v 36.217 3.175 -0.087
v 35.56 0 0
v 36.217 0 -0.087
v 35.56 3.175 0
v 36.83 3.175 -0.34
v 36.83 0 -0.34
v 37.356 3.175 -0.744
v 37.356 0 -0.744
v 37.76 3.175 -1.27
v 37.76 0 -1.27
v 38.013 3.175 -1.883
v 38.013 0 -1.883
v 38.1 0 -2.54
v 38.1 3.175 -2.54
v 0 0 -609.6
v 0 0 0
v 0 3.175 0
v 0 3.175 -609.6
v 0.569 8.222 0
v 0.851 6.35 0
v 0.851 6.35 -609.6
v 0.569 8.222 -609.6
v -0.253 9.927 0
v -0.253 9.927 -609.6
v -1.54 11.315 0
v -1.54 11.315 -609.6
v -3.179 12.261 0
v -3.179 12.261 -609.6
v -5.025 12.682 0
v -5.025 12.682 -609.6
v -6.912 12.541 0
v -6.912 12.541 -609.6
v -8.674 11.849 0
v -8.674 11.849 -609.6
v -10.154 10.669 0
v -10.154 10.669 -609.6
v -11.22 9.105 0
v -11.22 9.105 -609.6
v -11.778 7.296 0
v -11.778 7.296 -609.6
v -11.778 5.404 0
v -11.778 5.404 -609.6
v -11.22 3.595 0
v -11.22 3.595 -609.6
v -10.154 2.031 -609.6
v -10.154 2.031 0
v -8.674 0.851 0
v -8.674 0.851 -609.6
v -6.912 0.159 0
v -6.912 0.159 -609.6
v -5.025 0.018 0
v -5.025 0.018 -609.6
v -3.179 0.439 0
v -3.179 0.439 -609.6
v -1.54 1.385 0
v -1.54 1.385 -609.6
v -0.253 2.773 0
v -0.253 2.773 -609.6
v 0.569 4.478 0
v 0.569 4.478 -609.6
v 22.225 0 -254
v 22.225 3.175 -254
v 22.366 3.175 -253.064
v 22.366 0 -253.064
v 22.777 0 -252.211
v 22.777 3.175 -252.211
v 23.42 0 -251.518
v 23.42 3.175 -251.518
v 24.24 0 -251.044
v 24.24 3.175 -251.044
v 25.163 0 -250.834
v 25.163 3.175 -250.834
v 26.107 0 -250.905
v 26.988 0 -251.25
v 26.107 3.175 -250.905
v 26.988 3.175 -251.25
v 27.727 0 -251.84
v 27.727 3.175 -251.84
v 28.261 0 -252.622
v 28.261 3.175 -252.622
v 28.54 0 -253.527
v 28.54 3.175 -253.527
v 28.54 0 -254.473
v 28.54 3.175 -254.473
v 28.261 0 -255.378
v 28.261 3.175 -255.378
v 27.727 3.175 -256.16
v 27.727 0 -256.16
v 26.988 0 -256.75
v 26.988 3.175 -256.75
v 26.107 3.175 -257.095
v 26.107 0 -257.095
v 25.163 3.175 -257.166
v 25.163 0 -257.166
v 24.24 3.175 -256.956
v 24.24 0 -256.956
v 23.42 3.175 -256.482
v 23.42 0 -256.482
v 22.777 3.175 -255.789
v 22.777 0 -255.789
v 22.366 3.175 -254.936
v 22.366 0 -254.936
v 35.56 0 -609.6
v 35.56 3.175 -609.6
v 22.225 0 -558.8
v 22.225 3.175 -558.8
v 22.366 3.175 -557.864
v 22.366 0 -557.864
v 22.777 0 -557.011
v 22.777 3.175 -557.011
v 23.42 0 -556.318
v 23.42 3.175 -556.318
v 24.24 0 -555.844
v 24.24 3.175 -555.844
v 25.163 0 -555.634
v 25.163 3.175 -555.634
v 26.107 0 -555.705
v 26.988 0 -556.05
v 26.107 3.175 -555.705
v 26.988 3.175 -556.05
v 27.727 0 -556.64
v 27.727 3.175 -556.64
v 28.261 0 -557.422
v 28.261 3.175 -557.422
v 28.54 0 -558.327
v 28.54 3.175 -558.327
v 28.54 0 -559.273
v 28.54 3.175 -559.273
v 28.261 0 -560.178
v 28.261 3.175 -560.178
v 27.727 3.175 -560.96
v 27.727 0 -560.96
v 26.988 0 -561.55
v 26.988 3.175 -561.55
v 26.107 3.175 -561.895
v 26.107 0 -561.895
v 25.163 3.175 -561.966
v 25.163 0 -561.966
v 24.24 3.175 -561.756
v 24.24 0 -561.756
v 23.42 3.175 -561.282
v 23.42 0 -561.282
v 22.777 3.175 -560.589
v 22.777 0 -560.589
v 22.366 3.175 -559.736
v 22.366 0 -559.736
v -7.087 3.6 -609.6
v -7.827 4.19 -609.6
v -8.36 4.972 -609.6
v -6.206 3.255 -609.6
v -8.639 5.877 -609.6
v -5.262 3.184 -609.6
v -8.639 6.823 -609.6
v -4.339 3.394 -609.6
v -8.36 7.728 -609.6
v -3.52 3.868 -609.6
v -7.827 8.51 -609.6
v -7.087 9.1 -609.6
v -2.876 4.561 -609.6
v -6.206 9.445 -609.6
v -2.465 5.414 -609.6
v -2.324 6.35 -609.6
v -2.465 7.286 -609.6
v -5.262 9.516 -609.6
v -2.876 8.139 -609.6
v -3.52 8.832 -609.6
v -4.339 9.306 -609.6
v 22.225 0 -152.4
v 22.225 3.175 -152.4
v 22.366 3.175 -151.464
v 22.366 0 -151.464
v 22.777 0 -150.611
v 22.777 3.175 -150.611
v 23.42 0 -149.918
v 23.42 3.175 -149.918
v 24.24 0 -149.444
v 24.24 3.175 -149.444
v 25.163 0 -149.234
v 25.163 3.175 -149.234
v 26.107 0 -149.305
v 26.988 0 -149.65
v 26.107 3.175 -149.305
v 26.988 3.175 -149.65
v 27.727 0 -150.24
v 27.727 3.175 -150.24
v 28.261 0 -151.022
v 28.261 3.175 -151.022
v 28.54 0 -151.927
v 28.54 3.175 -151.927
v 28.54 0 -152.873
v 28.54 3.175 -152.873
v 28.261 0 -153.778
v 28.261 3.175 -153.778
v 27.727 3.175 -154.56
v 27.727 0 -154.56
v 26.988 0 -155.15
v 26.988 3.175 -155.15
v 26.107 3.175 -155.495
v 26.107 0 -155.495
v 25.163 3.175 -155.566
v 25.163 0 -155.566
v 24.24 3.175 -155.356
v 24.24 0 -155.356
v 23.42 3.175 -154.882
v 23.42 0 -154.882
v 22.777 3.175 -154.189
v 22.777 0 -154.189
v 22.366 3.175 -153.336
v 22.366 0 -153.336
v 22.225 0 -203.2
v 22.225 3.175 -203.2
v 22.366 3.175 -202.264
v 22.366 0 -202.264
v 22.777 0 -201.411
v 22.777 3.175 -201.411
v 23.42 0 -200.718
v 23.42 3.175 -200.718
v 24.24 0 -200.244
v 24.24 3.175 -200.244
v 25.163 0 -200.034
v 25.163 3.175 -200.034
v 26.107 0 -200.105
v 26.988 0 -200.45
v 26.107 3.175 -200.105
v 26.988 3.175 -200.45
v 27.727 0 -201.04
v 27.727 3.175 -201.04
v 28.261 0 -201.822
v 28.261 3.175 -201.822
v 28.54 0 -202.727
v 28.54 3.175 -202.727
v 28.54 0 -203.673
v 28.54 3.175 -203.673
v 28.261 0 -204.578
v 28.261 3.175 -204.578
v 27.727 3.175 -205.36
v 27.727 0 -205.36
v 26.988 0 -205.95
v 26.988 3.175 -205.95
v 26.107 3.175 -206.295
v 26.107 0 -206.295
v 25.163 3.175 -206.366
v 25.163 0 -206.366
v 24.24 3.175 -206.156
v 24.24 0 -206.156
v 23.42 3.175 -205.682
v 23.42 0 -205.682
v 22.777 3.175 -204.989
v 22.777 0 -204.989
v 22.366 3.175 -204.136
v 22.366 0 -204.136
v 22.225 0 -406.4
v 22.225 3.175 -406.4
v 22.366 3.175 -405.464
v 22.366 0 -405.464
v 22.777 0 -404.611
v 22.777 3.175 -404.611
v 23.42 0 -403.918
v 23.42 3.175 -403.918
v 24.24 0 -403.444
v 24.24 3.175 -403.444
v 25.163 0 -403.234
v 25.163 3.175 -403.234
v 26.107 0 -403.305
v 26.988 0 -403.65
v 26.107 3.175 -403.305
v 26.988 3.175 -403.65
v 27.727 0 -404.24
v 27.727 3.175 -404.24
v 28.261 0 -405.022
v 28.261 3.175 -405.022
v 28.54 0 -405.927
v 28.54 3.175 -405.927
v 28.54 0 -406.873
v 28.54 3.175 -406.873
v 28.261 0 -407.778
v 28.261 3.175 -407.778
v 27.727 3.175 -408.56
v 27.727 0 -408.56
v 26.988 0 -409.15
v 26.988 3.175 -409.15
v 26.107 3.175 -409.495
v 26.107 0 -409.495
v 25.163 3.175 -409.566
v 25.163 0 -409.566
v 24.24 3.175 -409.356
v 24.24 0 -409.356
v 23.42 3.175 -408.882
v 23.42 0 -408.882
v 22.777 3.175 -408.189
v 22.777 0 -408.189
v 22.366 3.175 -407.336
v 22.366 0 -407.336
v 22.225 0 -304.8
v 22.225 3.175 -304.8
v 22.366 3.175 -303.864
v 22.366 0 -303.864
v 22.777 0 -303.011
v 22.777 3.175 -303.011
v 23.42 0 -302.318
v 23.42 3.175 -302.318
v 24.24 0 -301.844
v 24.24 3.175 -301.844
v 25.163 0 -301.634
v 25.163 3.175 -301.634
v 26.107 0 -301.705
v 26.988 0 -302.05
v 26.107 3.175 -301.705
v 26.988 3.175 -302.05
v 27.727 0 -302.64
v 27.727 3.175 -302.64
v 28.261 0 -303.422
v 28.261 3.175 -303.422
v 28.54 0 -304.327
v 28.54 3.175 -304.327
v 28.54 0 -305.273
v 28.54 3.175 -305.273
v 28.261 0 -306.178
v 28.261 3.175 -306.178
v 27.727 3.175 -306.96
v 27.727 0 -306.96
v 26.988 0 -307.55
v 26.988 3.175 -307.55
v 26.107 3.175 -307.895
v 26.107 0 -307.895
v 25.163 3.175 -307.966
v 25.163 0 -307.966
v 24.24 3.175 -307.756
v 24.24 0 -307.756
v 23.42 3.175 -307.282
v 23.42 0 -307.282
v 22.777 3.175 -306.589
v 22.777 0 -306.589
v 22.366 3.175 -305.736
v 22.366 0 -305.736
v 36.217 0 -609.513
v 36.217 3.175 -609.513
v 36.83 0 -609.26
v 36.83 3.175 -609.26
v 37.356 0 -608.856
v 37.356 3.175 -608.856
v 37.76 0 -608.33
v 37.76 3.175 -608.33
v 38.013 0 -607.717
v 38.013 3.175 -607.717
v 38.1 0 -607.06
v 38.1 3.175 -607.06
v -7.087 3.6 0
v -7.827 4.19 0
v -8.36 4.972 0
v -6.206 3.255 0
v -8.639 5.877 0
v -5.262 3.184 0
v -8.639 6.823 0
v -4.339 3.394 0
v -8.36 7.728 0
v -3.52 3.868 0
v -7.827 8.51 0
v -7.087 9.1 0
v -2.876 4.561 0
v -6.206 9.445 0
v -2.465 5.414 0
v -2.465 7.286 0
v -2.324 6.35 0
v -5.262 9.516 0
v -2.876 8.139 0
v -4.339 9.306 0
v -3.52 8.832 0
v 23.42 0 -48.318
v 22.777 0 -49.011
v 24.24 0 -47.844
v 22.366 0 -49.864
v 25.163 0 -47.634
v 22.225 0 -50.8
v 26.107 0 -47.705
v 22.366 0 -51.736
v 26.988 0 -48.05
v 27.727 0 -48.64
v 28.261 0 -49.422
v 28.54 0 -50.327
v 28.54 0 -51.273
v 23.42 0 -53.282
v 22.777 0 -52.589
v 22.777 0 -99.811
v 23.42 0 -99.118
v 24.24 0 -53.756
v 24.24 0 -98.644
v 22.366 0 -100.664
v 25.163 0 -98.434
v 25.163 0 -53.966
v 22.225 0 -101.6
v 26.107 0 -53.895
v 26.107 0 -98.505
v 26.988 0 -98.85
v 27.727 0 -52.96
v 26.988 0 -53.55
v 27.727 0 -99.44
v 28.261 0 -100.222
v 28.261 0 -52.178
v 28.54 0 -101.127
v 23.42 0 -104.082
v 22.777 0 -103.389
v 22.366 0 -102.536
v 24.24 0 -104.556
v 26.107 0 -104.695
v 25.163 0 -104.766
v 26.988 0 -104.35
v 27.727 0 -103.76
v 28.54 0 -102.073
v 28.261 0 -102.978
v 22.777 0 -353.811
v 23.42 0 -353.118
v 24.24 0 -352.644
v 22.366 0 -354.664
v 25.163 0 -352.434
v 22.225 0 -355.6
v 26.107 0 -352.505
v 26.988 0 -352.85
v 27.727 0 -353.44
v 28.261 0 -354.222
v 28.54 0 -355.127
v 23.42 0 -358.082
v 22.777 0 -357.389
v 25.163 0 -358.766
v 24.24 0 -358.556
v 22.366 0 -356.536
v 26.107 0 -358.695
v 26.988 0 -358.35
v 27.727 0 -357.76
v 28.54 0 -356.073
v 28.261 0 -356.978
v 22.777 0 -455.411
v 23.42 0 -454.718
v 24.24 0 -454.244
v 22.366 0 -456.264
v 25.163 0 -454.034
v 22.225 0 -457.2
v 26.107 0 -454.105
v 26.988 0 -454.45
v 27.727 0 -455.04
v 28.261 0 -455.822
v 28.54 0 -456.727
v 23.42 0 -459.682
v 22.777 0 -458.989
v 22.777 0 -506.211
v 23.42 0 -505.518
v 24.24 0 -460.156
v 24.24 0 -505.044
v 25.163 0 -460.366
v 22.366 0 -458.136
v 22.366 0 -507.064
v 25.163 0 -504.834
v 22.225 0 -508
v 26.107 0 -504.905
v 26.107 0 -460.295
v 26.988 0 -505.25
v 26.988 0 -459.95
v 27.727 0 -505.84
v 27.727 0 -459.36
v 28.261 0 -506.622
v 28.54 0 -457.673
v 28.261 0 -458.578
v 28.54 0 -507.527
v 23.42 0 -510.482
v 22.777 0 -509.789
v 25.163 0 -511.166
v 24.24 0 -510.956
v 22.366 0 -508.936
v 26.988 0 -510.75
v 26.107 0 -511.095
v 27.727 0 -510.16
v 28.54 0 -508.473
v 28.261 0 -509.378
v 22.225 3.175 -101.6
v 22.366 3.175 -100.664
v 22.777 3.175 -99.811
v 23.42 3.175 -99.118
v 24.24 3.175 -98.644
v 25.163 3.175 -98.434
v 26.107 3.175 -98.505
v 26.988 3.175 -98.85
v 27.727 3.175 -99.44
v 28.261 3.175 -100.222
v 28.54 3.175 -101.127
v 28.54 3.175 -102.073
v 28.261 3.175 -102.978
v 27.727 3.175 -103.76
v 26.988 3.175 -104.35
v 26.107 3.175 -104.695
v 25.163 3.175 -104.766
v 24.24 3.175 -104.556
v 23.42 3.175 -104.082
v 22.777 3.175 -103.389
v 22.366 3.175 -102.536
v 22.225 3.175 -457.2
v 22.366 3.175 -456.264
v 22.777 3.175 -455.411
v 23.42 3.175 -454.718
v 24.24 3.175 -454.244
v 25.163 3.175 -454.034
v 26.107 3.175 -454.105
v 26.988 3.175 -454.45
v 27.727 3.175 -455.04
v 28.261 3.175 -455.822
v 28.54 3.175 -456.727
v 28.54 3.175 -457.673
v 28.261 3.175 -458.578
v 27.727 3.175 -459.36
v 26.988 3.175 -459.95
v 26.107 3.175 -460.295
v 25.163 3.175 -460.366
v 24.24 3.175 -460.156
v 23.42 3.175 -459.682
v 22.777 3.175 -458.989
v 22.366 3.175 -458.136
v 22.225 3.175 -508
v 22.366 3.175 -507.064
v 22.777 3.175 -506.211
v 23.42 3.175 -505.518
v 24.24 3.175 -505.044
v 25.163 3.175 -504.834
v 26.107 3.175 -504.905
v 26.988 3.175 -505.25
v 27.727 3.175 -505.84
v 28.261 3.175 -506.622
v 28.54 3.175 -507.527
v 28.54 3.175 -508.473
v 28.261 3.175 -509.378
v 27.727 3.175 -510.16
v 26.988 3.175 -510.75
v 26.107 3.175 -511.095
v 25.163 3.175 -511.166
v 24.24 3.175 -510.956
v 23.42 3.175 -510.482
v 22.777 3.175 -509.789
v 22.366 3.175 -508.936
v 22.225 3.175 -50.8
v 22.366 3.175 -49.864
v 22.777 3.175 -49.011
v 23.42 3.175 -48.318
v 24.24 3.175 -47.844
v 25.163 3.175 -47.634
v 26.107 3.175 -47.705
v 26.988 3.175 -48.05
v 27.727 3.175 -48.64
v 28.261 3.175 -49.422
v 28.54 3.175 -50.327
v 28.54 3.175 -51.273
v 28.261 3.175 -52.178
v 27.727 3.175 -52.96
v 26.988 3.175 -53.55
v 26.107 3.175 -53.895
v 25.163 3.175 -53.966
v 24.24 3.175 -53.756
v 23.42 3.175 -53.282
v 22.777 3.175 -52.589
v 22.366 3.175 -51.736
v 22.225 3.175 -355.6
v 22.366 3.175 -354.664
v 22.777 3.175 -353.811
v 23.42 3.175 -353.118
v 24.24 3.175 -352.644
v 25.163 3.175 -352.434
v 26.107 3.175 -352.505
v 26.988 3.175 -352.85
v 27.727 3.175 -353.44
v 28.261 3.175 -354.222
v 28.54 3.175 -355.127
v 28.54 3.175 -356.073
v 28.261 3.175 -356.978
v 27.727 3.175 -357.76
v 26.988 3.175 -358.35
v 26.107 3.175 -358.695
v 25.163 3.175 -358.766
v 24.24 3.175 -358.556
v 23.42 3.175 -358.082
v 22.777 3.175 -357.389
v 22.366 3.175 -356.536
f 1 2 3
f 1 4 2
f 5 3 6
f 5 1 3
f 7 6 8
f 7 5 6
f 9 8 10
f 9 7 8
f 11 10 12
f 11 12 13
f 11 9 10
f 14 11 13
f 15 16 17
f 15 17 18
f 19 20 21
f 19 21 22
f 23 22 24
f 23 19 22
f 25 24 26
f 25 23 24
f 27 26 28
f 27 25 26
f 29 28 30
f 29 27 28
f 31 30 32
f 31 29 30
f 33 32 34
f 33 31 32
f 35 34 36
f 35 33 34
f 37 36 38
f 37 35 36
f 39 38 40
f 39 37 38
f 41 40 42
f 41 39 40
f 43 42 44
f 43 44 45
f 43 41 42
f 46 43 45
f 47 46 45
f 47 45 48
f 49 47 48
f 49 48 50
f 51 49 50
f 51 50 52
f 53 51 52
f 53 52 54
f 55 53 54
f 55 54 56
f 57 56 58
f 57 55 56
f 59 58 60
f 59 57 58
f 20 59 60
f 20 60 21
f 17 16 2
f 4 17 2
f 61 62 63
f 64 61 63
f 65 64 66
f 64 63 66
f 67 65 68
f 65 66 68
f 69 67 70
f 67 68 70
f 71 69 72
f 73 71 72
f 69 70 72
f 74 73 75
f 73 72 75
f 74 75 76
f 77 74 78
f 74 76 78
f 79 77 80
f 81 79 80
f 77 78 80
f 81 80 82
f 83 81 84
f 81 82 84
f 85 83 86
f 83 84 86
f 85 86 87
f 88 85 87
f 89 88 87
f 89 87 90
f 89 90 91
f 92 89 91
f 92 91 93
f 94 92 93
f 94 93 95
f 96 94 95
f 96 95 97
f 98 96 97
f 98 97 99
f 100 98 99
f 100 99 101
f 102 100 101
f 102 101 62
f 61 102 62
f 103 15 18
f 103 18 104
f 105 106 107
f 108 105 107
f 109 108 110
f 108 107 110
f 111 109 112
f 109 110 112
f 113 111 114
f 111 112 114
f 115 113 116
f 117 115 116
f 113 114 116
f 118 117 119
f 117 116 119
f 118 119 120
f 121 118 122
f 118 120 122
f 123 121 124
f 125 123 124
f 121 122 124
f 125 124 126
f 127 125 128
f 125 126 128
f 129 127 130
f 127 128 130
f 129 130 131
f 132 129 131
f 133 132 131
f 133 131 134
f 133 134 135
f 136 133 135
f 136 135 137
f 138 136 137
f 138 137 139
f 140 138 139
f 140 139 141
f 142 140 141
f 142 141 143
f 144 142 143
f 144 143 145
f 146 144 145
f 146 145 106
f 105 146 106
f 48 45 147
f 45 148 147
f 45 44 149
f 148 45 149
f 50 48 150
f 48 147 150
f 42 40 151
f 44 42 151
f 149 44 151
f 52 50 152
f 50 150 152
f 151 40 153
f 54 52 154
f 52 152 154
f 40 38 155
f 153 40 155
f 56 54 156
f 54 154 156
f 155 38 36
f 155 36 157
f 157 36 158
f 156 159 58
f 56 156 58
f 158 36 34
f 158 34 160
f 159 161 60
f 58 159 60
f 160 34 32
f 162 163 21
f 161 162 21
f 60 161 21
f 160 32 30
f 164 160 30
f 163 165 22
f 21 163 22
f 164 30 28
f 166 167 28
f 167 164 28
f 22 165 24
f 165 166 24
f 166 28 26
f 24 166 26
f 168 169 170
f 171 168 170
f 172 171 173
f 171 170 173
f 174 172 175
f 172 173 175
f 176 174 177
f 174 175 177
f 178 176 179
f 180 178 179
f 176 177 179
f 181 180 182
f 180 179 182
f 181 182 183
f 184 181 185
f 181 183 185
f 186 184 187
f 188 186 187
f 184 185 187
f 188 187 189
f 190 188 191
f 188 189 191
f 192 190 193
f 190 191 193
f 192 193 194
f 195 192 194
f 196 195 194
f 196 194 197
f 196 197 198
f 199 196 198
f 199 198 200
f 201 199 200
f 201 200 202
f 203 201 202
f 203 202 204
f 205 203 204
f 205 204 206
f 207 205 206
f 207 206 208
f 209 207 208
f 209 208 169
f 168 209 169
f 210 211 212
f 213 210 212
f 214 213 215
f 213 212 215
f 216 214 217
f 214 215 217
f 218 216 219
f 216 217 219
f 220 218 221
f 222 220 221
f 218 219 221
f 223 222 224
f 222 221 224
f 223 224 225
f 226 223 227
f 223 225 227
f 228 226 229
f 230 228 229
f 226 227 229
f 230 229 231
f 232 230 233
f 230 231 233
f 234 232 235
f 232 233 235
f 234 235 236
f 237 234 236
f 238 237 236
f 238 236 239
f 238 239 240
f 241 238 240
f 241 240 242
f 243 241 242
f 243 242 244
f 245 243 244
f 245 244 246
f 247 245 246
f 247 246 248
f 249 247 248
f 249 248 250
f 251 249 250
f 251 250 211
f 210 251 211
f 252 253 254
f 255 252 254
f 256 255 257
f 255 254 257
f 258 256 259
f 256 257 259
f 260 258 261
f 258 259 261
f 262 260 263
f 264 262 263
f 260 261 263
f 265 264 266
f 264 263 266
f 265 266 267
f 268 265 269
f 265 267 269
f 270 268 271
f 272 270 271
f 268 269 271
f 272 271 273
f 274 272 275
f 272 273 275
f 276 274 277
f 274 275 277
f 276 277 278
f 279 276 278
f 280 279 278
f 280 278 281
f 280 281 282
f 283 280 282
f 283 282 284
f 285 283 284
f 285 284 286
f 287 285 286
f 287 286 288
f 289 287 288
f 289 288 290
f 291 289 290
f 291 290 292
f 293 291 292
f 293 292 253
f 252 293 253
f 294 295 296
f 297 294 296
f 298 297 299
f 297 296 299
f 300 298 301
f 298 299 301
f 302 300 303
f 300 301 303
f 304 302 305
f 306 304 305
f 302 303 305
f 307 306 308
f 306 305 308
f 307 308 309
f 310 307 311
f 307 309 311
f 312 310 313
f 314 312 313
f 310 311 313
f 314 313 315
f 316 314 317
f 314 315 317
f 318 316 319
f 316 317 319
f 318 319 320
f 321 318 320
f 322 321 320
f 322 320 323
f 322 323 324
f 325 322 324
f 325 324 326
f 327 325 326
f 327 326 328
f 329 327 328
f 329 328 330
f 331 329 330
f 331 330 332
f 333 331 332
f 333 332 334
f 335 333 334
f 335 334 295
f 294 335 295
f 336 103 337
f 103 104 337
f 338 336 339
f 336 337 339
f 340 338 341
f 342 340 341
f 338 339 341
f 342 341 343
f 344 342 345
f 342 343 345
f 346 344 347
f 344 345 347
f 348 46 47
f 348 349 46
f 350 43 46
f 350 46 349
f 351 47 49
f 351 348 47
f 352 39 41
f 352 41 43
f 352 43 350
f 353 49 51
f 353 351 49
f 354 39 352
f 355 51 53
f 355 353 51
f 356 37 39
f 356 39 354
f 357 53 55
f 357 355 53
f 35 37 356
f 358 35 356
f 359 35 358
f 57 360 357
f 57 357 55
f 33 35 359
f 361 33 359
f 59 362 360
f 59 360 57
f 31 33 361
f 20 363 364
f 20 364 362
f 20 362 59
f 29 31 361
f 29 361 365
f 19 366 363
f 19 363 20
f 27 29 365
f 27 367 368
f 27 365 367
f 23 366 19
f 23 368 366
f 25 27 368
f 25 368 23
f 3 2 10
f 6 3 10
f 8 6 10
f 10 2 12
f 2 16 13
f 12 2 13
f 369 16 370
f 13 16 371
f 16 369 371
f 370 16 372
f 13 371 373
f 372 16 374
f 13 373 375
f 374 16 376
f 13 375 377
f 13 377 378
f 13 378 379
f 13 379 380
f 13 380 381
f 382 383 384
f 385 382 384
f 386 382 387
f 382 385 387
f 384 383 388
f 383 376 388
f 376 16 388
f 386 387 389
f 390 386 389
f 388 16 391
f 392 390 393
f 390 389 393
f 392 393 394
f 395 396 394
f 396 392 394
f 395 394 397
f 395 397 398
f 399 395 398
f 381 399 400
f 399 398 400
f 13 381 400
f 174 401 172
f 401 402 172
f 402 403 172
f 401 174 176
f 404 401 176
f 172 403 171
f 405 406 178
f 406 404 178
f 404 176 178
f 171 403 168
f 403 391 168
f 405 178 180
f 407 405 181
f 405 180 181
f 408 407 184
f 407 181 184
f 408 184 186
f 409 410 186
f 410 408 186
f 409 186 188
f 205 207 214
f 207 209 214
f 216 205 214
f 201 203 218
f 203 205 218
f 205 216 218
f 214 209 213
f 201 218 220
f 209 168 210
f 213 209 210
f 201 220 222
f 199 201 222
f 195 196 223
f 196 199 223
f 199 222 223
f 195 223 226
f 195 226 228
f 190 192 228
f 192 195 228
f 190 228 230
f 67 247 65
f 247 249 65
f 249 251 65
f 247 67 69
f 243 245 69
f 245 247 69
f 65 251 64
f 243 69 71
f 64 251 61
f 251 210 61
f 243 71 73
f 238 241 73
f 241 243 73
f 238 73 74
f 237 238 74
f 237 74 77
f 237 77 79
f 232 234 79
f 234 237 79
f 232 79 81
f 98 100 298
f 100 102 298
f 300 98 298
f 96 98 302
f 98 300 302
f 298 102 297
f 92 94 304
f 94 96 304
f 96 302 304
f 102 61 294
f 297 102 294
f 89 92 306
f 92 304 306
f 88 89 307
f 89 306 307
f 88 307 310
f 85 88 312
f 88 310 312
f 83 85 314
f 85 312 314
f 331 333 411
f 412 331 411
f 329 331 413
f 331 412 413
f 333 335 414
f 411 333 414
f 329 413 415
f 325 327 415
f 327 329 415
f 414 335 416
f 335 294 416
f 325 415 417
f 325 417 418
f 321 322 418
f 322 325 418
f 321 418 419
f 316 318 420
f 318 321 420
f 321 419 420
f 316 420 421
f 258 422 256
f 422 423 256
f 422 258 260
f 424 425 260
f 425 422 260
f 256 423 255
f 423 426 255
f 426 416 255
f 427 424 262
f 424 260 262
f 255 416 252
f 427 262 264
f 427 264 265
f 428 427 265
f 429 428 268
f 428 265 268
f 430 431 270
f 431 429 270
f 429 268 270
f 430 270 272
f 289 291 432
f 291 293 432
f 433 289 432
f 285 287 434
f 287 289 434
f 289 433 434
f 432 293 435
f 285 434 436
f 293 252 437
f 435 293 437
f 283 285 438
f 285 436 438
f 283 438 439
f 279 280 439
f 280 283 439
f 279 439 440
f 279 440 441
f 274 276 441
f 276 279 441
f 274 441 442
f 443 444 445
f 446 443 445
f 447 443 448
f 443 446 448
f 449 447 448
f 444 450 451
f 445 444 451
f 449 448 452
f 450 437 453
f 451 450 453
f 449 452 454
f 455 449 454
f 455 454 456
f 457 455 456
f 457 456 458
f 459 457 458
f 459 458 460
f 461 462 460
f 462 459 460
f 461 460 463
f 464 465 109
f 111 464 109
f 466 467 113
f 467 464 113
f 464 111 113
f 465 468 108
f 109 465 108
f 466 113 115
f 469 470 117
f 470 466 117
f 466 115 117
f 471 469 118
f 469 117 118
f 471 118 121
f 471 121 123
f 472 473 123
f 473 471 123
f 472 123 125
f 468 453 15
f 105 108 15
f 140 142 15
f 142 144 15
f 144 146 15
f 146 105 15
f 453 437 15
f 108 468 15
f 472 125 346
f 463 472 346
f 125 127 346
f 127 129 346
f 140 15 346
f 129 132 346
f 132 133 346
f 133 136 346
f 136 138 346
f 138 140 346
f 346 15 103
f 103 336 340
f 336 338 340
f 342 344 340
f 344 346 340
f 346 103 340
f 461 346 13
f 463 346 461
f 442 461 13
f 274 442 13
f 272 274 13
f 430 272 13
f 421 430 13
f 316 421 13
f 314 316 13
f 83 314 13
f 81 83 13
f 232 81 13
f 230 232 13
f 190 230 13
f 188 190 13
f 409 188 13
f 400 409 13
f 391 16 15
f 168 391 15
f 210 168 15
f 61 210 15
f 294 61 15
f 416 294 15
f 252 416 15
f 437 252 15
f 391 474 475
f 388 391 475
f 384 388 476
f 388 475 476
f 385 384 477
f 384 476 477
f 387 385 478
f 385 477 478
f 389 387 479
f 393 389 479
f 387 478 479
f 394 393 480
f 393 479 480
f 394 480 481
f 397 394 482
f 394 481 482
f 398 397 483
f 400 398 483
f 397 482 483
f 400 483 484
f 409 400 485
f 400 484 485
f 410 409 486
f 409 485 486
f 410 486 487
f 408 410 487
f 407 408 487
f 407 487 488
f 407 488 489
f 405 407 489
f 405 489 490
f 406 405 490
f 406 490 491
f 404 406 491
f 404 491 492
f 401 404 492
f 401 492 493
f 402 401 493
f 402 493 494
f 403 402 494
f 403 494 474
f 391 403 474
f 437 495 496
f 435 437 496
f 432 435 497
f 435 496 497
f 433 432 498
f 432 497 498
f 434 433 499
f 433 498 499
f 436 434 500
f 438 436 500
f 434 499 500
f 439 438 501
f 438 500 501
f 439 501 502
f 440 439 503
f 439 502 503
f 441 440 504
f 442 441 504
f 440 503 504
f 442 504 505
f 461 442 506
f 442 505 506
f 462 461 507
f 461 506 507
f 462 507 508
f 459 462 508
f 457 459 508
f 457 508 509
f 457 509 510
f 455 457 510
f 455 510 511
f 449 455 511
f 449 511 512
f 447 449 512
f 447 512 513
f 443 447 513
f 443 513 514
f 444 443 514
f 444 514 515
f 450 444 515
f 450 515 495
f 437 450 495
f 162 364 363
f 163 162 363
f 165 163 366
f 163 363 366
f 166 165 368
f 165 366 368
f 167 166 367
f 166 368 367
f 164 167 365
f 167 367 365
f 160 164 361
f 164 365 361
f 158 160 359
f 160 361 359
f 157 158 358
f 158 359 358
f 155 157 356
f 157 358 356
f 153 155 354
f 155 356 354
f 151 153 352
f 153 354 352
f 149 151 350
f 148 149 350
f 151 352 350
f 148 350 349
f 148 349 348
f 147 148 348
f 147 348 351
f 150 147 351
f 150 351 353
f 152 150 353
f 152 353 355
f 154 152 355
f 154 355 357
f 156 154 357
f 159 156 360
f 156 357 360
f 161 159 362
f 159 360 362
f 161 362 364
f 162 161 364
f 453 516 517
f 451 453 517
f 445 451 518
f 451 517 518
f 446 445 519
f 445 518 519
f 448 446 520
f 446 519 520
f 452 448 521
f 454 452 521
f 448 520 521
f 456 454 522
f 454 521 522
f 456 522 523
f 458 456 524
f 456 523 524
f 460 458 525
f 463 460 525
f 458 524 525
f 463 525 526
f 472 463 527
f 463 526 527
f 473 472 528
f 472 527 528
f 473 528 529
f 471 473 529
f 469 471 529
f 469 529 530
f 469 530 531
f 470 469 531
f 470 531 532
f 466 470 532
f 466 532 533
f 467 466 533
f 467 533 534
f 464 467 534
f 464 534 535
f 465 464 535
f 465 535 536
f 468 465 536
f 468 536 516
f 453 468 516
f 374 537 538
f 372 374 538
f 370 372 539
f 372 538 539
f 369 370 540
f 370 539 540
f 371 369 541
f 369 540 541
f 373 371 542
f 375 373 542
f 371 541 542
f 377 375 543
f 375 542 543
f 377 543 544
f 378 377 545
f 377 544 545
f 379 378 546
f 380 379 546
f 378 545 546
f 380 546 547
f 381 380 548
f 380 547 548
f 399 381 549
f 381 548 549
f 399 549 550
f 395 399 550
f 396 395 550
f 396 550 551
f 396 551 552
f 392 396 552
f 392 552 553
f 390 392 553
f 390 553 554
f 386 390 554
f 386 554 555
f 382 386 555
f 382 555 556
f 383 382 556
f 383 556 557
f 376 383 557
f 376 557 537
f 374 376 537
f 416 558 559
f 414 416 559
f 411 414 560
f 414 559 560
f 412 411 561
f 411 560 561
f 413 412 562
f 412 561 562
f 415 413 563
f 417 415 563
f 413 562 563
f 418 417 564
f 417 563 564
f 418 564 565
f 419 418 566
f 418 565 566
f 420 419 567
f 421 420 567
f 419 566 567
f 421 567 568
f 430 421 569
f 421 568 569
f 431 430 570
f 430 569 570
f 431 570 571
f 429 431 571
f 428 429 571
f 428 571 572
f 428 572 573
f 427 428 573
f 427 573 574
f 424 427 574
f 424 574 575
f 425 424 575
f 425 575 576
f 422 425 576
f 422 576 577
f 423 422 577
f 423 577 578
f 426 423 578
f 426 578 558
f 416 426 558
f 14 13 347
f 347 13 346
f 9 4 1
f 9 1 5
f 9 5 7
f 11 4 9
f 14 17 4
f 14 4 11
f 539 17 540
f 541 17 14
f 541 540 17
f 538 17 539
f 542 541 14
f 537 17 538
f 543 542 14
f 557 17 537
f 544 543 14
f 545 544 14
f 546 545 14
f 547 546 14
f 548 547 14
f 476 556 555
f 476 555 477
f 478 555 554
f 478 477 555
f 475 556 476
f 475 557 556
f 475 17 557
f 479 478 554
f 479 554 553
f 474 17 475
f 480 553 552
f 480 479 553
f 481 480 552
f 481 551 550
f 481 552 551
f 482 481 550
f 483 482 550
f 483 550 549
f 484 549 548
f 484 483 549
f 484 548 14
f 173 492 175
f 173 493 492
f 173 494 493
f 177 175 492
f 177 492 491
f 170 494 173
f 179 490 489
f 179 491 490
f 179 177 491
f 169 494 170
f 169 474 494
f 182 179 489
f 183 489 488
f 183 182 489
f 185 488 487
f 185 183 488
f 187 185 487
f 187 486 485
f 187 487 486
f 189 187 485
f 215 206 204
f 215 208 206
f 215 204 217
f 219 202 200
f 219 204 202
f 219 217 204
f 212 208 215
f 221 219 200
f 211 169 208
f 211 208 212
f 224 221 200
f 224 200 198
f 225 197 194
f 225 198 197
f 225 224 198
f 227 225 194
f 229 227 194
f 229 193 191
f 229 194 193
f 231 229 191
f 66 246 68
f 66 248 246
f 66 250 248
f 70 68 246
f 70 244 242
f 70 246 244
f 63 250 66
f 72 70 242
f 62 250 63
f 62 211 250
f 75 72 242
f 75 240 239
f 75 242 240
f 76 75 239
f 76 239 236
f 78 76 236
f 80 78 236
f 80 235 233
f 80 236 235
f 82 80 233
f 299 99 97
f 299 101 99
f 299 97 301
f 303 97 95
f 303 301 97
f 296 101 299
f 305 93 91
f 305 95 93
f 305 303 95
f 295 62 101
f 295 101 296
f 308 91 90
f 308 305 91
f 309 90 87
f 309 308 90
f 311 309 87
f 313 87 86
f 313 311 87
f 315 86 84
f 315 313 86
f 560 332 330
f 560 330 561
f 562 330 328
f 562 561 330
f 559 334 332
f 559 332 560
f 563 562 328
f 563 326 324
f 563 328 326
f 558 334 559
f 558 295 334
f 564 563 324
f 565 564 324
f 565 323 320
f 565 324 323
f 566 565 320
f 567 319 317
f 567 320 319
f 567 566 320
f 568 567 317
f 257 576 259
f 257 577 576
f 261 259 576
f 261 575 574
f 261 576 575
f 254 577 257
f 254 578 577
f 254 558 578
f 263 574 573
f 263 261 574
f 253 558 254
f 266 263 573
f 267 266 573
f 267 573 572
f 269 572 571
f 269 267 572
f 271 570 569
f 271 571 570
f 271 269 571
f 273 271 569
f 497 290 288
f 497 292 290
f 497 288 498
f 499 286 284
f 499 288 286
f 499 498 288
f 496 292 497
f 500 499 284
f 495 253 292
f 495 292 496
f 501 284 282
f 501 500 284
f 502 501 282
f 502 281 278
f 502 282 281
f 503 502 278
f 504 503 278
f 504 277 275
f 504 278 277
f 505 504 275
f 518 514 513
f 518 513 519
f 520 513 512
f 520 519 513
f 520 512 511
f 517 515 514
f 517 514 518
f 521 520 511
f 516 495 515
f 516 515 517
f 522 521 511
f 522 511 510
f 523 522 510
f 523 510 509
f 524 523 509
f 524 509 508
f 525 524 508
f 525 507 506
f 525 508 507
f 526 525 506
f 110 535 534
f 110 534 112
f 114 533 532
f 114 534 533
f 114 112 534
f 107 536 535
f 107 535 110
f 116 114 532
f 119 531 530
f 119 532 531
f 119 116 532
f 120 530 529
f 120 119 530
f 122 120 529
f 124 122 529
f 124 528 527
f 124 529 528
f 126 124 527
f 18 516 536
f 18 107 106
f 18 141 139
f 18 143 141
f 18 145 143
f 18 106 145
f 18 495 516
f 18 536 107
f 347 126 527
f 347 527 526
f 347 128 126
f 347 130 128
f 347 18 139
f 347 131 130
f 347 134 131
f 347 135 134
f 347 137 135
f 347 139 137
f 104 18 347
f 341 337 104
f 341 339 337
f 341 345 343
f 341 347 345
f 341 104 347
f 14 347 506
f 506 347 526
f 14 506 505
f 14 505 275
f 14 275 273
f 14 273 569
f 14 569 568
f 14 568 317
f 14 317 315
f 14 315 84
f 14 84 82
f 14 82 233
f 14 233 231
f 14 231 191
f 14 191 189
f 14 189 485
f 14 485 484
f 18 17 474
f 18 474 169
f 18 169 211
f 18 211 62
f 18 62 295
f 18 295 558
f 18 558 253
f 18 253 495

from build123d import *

# Parameters (mm, degrees)
SKETCH1_W           = 38.1
SKETCH1_H           = 609.6
BOSS_EXTRUDE1_DEPTH = 3.175
CUT_EXTRUDE1_REACH  = 5.175
SKETCH2_R           = 3.175
FILLET1_R           = 2.54
SKETCH3_R           = 6.35
SKETCH3_R_2         = 3.175
BOSS_EXTRUDE2_DEPTH = 609.6


with BuildPart() as part:
    # Sketch1 → Boss-Extrude1 (new body)
    with BuildSketch(Plane(origin=(0, 0, 0), x_dir=(1, 0, 0), z_dir=(0, 1, 0))):
        with Locations((19.05, 304.8)):
            Rectangle(SKETCH1_W, SKETCH1_H)
    extrude(amount=BOSS_EXTRUDE1_DEPTH)

    # Sketch2 → Cut-Extrude1 (cut, up to next)
    with BuildSketch(Plane(origin=(0, 3.175, 0), x_dir=(-1, 0, 0), z_dir=(0, 1, 0)), mode=Mode.PRIVATE) as cut_extrude1_sk1:
        with Locations((-25.4, -355.6)):
            Circle(SKETCH2_R)
    cut_extrude1_tool1 = extrude(cut_extrude1_sk1.sketch, amount=-CUT_EXTRUDE1_REACH, mode=Mode.PRIVATE) & part.part
    add(cut_extrude1_tool1.solids().sort_by_distance((25.4, 3.175, -355.6))[0], mode=Mode.SUBTRACT)
    # Sketch2 → Cut-Extrude1 (cut, up to next)
    with BuildSketch(Plane(origin=(0, 3.175, 0), x_dir=(-1, 0, 0), z_dir=(0, 1, 0)), mode=Mode.PRIVATE) as cut_extrude1_sk2:
        with Locations((-25.4, -304.8)):
            Circle(SKETCH2_R)
    cut_extrude1_tool2 = extrude(cut_extrude1_sk2.sketch, amount=-CUT_EXTRUDE1_REACH, mode=Mode.PRIVATE) & part.part
    add(cut_extrude1_tool2.solids().sort_by_distance((25.4, 3.175, -304.8))[0], mode=Mode.SUBTRACT)
    # Sketch2 → Cut-Extrude1 (cut, up to next)
    with BuildSketch(Plane(origin=(0, 3.175, 0), x_dir=(-1, 0, 0), z_dir=(0, 1, 0)), mode=Mode.PRIVATE) as cut_extrude1_sk3:
        with Locations((-25.4, -254)):
            Circle(SKETCH2_R)
    cut_extrude1_tool3 = extrude(cut_extrude1_sk3.sketch, amount=-CUT_EXTRUDE1_REACH, mode=Mode.PRIVATE) & part.part
    add(cut_extrude1_tool3.solids().sort_by_distance((25.4, 3.175, -254))[0], mode=Mode.SUBTRACT)
    # Sketch2 → Cut-Extrude1 (cut, up to next)
    with BuildSketch(Plane(origin=(0, 3.175, 0), x_dir=(-1, 0, 0), z_dir=(0, 1, 0)), mode=Mode.PRIVATE) as cut_extrude1_sk4:
        with Locations((-25.4, -406.4)):
            Circle(SKETCH2_R)
    cut_extrude1_tool4 = extrude(cut_extrude1_sk4.sketch, amount=-CUT_EXTRUDE1_REACH, mode=Mode.PRIVATE) & part.part
    add(cut_extrude1_tool4.solids().sort_by_distance((25.4, 3.175, -406.4))[0], mode=Mode.SUBTRACT)
    # Sketch2 → Cut-Extrude1 (cut, up to next)
    with BuildSketch(Plane(origin=(0, 3.175, 0), x_dir=(-1, 0, 0), z_dir=(0, 1, 0)), mode=Mode.PRIVATE) as cut_extrude1_sk5:
        with Locations((-25.4, -457.2)):
            Circle(SKETCH2_R)
    cut_extrude1_tool5 = extrude(cut_extrude1_sk5.sketch, amount=-CUT_EXTRUDE1_REACH, mode=Mode.PRIVATE) & part.part
    add(cut_extrude1_tool5.solids().sort_by_distance((25.4, 3.175, -457.2))[0], mode=Mode.SUBTRACT)
    # Sketch2 → Cut-Extrude1 (cut, up to next)
    with BuildSketch(Plane(origin=(0, 3.175, 0), x_dir=(-1, 0, 0), z_dir=(0, 1, 0)), mode=Mode.PRIVATE) as cut_extrude1_sk6:
        with Locations((-25.4, -508)):
            Circle(SKETCH2_R)
    cut_extrude1_tool6 = extrude(cut_extrude1_sk6.sketch, amount=-CUT_EXTRUDE1_REACH, mode=Mode.PRIVATE) & part.part
    add(cut_extrude1_tool6.solids().sort_by_distance((25.4, 3.175, -508))[0], mode=Mode.SUBTRACT)
    # Sketch2 → Cut-Extrude1 (cut, up to next)
    with BuildSketch(Plane(origin=(0, 3.175, 0), x_dir=(-1, 0, 0), z_dir=(0, 1, 0)), mode=Mode.PRIVATE) as cut_extrude1_sk7:
        with Locations((-25.4, -558.8)):
            Circle(SKETCH2_R)
    cut_extrude1_tool7 = extrude(cut_extrude1_sk7.sketch, amount=-CUT_EXTRUDE1_REACH, mode=Mode.PRIVATE) & part.part
    add(cut_extrude1_tool7.solids().sort_by_distance((25.4, 3.175, -558.8))[0], mode=Mode.SUBTRACT)
    # Sketch2 → Cut-Extrude1 (cut, up to next)
    with BuildSketch(Plane(origin=(0, 3.175, 0), x_dir=(-1, 0, 0), z_dir=(0, 1, 0)), mode=Mode.PRIVATE) as cut_extrude1_sk8:
        with Locations((-25.4, -101.6)):
            Circle(SKETCH2_R)
    cut_extrude1_tool8 = extrude(cut_extrude1_sk8.sketch, amount=-CUT_EXTRUDE1_REACH, mode=Mode.PRIVATE) & part.part
    add(cut_extrude1_tool8.solids().sort_by_distance((25.4, 3.175, -101.6))[0], mode=Mode.SUBTRACT)
    # Sketch2 → Cut-Extrude1 (cut, up to next)
    with BuildSketch(Plane(origin=(0, 3.175, 0), x_dir=(-1, 0, 0), z_dir=(0, 1, 0)), mode=Mode.PRIVATE) as cut_extrude1_sk9:
        with Locations((-25.4, -50.8)):
            Circle(SKETCH2_R)
    cut_extrude1_tool9 = extrude(cut_extrude1_sk9.sketch, amount=-CUT_EXTRUDE1_REACH, mode=Mode.PRIVATE) & part.part
    add(cut_extrude1_tool9.solids().sort_by_distance((25.4, 3.175, -50.8))[0], mode=Mode.SUBTRACT)
    # Sketch2 → Cut-Extrude1 (cut, up to next)
    with BuildSketch(Plane(origin=(0, 3.175, 0), x_dir=(-1, 0, 0), z_dir=(0, 1, 0)), mode=Mode.PRIVATE) as cut_extrude1_sk10:
        with Locations((-25.4, -203.2)):
            Circle(SKETCH2_R)
    cut_extrude1_tool10 = extrude(cut_extrude1_sk10.sketch, amount=-CUT_EXTRUDE1_REACH, mode=Mode.PRIVATE) & part.part
    add(cut_extrude1_tool10.solids().sort_by_distance((25.4, 3.175, -203.2))[0], mode=Mode.SUBTRACT)
    # Sketch2 → Cut-Extrude1 (cut, up to next)
    with BuildSketch(Plane(origin=(0, 3.175, 0), x_dir=(-1, 0, 0), z_dir=(0, 1, 0)), mode=Mode.PRIVATE) as cut_extrude1_sk11:
        with Locations((-25.4, -152.4)):
            Circle(SKETCH2_R)
    cut_extrude1_tool11 = extrude(cut_extrude1_sk11.sketch, amount=-CUT_EXTRUDE1_REACH, mode=Mode.PRIVATE) & part.part
    add(cut_extrude1_tool11.solids().sort_by_distance((25.4, 3.175, -152.4))[0], mode=Mode.SUBTRACT)

    # Fillet1
    fillet1_edges = [part.edges().sort_by_distance(p)[0] for p in [
        (38.1, 1.5875, -609.6),
        (38.1, 1.5875, 0),
    ]]
    fillet(fillet1_edges, radius=FILLET1_R)


with BuildPart() as body_2:
    # Sketch3 → Boss-Extrude2 (new body)
    with BuildSketch(Plane.XY):
        with Locations((-5.499261314, 6.35)):
            Circle(SKETCH3_R)
        with Locations((-5.499261314, 6.35)):
            Circle(SKETCH3_R_2, mode=Mode.SUBTRACT)
    extrude(amount=-BOSS_EXTRUDE2_DEPTH)


solid = Compound([part.part, body_2.part])
